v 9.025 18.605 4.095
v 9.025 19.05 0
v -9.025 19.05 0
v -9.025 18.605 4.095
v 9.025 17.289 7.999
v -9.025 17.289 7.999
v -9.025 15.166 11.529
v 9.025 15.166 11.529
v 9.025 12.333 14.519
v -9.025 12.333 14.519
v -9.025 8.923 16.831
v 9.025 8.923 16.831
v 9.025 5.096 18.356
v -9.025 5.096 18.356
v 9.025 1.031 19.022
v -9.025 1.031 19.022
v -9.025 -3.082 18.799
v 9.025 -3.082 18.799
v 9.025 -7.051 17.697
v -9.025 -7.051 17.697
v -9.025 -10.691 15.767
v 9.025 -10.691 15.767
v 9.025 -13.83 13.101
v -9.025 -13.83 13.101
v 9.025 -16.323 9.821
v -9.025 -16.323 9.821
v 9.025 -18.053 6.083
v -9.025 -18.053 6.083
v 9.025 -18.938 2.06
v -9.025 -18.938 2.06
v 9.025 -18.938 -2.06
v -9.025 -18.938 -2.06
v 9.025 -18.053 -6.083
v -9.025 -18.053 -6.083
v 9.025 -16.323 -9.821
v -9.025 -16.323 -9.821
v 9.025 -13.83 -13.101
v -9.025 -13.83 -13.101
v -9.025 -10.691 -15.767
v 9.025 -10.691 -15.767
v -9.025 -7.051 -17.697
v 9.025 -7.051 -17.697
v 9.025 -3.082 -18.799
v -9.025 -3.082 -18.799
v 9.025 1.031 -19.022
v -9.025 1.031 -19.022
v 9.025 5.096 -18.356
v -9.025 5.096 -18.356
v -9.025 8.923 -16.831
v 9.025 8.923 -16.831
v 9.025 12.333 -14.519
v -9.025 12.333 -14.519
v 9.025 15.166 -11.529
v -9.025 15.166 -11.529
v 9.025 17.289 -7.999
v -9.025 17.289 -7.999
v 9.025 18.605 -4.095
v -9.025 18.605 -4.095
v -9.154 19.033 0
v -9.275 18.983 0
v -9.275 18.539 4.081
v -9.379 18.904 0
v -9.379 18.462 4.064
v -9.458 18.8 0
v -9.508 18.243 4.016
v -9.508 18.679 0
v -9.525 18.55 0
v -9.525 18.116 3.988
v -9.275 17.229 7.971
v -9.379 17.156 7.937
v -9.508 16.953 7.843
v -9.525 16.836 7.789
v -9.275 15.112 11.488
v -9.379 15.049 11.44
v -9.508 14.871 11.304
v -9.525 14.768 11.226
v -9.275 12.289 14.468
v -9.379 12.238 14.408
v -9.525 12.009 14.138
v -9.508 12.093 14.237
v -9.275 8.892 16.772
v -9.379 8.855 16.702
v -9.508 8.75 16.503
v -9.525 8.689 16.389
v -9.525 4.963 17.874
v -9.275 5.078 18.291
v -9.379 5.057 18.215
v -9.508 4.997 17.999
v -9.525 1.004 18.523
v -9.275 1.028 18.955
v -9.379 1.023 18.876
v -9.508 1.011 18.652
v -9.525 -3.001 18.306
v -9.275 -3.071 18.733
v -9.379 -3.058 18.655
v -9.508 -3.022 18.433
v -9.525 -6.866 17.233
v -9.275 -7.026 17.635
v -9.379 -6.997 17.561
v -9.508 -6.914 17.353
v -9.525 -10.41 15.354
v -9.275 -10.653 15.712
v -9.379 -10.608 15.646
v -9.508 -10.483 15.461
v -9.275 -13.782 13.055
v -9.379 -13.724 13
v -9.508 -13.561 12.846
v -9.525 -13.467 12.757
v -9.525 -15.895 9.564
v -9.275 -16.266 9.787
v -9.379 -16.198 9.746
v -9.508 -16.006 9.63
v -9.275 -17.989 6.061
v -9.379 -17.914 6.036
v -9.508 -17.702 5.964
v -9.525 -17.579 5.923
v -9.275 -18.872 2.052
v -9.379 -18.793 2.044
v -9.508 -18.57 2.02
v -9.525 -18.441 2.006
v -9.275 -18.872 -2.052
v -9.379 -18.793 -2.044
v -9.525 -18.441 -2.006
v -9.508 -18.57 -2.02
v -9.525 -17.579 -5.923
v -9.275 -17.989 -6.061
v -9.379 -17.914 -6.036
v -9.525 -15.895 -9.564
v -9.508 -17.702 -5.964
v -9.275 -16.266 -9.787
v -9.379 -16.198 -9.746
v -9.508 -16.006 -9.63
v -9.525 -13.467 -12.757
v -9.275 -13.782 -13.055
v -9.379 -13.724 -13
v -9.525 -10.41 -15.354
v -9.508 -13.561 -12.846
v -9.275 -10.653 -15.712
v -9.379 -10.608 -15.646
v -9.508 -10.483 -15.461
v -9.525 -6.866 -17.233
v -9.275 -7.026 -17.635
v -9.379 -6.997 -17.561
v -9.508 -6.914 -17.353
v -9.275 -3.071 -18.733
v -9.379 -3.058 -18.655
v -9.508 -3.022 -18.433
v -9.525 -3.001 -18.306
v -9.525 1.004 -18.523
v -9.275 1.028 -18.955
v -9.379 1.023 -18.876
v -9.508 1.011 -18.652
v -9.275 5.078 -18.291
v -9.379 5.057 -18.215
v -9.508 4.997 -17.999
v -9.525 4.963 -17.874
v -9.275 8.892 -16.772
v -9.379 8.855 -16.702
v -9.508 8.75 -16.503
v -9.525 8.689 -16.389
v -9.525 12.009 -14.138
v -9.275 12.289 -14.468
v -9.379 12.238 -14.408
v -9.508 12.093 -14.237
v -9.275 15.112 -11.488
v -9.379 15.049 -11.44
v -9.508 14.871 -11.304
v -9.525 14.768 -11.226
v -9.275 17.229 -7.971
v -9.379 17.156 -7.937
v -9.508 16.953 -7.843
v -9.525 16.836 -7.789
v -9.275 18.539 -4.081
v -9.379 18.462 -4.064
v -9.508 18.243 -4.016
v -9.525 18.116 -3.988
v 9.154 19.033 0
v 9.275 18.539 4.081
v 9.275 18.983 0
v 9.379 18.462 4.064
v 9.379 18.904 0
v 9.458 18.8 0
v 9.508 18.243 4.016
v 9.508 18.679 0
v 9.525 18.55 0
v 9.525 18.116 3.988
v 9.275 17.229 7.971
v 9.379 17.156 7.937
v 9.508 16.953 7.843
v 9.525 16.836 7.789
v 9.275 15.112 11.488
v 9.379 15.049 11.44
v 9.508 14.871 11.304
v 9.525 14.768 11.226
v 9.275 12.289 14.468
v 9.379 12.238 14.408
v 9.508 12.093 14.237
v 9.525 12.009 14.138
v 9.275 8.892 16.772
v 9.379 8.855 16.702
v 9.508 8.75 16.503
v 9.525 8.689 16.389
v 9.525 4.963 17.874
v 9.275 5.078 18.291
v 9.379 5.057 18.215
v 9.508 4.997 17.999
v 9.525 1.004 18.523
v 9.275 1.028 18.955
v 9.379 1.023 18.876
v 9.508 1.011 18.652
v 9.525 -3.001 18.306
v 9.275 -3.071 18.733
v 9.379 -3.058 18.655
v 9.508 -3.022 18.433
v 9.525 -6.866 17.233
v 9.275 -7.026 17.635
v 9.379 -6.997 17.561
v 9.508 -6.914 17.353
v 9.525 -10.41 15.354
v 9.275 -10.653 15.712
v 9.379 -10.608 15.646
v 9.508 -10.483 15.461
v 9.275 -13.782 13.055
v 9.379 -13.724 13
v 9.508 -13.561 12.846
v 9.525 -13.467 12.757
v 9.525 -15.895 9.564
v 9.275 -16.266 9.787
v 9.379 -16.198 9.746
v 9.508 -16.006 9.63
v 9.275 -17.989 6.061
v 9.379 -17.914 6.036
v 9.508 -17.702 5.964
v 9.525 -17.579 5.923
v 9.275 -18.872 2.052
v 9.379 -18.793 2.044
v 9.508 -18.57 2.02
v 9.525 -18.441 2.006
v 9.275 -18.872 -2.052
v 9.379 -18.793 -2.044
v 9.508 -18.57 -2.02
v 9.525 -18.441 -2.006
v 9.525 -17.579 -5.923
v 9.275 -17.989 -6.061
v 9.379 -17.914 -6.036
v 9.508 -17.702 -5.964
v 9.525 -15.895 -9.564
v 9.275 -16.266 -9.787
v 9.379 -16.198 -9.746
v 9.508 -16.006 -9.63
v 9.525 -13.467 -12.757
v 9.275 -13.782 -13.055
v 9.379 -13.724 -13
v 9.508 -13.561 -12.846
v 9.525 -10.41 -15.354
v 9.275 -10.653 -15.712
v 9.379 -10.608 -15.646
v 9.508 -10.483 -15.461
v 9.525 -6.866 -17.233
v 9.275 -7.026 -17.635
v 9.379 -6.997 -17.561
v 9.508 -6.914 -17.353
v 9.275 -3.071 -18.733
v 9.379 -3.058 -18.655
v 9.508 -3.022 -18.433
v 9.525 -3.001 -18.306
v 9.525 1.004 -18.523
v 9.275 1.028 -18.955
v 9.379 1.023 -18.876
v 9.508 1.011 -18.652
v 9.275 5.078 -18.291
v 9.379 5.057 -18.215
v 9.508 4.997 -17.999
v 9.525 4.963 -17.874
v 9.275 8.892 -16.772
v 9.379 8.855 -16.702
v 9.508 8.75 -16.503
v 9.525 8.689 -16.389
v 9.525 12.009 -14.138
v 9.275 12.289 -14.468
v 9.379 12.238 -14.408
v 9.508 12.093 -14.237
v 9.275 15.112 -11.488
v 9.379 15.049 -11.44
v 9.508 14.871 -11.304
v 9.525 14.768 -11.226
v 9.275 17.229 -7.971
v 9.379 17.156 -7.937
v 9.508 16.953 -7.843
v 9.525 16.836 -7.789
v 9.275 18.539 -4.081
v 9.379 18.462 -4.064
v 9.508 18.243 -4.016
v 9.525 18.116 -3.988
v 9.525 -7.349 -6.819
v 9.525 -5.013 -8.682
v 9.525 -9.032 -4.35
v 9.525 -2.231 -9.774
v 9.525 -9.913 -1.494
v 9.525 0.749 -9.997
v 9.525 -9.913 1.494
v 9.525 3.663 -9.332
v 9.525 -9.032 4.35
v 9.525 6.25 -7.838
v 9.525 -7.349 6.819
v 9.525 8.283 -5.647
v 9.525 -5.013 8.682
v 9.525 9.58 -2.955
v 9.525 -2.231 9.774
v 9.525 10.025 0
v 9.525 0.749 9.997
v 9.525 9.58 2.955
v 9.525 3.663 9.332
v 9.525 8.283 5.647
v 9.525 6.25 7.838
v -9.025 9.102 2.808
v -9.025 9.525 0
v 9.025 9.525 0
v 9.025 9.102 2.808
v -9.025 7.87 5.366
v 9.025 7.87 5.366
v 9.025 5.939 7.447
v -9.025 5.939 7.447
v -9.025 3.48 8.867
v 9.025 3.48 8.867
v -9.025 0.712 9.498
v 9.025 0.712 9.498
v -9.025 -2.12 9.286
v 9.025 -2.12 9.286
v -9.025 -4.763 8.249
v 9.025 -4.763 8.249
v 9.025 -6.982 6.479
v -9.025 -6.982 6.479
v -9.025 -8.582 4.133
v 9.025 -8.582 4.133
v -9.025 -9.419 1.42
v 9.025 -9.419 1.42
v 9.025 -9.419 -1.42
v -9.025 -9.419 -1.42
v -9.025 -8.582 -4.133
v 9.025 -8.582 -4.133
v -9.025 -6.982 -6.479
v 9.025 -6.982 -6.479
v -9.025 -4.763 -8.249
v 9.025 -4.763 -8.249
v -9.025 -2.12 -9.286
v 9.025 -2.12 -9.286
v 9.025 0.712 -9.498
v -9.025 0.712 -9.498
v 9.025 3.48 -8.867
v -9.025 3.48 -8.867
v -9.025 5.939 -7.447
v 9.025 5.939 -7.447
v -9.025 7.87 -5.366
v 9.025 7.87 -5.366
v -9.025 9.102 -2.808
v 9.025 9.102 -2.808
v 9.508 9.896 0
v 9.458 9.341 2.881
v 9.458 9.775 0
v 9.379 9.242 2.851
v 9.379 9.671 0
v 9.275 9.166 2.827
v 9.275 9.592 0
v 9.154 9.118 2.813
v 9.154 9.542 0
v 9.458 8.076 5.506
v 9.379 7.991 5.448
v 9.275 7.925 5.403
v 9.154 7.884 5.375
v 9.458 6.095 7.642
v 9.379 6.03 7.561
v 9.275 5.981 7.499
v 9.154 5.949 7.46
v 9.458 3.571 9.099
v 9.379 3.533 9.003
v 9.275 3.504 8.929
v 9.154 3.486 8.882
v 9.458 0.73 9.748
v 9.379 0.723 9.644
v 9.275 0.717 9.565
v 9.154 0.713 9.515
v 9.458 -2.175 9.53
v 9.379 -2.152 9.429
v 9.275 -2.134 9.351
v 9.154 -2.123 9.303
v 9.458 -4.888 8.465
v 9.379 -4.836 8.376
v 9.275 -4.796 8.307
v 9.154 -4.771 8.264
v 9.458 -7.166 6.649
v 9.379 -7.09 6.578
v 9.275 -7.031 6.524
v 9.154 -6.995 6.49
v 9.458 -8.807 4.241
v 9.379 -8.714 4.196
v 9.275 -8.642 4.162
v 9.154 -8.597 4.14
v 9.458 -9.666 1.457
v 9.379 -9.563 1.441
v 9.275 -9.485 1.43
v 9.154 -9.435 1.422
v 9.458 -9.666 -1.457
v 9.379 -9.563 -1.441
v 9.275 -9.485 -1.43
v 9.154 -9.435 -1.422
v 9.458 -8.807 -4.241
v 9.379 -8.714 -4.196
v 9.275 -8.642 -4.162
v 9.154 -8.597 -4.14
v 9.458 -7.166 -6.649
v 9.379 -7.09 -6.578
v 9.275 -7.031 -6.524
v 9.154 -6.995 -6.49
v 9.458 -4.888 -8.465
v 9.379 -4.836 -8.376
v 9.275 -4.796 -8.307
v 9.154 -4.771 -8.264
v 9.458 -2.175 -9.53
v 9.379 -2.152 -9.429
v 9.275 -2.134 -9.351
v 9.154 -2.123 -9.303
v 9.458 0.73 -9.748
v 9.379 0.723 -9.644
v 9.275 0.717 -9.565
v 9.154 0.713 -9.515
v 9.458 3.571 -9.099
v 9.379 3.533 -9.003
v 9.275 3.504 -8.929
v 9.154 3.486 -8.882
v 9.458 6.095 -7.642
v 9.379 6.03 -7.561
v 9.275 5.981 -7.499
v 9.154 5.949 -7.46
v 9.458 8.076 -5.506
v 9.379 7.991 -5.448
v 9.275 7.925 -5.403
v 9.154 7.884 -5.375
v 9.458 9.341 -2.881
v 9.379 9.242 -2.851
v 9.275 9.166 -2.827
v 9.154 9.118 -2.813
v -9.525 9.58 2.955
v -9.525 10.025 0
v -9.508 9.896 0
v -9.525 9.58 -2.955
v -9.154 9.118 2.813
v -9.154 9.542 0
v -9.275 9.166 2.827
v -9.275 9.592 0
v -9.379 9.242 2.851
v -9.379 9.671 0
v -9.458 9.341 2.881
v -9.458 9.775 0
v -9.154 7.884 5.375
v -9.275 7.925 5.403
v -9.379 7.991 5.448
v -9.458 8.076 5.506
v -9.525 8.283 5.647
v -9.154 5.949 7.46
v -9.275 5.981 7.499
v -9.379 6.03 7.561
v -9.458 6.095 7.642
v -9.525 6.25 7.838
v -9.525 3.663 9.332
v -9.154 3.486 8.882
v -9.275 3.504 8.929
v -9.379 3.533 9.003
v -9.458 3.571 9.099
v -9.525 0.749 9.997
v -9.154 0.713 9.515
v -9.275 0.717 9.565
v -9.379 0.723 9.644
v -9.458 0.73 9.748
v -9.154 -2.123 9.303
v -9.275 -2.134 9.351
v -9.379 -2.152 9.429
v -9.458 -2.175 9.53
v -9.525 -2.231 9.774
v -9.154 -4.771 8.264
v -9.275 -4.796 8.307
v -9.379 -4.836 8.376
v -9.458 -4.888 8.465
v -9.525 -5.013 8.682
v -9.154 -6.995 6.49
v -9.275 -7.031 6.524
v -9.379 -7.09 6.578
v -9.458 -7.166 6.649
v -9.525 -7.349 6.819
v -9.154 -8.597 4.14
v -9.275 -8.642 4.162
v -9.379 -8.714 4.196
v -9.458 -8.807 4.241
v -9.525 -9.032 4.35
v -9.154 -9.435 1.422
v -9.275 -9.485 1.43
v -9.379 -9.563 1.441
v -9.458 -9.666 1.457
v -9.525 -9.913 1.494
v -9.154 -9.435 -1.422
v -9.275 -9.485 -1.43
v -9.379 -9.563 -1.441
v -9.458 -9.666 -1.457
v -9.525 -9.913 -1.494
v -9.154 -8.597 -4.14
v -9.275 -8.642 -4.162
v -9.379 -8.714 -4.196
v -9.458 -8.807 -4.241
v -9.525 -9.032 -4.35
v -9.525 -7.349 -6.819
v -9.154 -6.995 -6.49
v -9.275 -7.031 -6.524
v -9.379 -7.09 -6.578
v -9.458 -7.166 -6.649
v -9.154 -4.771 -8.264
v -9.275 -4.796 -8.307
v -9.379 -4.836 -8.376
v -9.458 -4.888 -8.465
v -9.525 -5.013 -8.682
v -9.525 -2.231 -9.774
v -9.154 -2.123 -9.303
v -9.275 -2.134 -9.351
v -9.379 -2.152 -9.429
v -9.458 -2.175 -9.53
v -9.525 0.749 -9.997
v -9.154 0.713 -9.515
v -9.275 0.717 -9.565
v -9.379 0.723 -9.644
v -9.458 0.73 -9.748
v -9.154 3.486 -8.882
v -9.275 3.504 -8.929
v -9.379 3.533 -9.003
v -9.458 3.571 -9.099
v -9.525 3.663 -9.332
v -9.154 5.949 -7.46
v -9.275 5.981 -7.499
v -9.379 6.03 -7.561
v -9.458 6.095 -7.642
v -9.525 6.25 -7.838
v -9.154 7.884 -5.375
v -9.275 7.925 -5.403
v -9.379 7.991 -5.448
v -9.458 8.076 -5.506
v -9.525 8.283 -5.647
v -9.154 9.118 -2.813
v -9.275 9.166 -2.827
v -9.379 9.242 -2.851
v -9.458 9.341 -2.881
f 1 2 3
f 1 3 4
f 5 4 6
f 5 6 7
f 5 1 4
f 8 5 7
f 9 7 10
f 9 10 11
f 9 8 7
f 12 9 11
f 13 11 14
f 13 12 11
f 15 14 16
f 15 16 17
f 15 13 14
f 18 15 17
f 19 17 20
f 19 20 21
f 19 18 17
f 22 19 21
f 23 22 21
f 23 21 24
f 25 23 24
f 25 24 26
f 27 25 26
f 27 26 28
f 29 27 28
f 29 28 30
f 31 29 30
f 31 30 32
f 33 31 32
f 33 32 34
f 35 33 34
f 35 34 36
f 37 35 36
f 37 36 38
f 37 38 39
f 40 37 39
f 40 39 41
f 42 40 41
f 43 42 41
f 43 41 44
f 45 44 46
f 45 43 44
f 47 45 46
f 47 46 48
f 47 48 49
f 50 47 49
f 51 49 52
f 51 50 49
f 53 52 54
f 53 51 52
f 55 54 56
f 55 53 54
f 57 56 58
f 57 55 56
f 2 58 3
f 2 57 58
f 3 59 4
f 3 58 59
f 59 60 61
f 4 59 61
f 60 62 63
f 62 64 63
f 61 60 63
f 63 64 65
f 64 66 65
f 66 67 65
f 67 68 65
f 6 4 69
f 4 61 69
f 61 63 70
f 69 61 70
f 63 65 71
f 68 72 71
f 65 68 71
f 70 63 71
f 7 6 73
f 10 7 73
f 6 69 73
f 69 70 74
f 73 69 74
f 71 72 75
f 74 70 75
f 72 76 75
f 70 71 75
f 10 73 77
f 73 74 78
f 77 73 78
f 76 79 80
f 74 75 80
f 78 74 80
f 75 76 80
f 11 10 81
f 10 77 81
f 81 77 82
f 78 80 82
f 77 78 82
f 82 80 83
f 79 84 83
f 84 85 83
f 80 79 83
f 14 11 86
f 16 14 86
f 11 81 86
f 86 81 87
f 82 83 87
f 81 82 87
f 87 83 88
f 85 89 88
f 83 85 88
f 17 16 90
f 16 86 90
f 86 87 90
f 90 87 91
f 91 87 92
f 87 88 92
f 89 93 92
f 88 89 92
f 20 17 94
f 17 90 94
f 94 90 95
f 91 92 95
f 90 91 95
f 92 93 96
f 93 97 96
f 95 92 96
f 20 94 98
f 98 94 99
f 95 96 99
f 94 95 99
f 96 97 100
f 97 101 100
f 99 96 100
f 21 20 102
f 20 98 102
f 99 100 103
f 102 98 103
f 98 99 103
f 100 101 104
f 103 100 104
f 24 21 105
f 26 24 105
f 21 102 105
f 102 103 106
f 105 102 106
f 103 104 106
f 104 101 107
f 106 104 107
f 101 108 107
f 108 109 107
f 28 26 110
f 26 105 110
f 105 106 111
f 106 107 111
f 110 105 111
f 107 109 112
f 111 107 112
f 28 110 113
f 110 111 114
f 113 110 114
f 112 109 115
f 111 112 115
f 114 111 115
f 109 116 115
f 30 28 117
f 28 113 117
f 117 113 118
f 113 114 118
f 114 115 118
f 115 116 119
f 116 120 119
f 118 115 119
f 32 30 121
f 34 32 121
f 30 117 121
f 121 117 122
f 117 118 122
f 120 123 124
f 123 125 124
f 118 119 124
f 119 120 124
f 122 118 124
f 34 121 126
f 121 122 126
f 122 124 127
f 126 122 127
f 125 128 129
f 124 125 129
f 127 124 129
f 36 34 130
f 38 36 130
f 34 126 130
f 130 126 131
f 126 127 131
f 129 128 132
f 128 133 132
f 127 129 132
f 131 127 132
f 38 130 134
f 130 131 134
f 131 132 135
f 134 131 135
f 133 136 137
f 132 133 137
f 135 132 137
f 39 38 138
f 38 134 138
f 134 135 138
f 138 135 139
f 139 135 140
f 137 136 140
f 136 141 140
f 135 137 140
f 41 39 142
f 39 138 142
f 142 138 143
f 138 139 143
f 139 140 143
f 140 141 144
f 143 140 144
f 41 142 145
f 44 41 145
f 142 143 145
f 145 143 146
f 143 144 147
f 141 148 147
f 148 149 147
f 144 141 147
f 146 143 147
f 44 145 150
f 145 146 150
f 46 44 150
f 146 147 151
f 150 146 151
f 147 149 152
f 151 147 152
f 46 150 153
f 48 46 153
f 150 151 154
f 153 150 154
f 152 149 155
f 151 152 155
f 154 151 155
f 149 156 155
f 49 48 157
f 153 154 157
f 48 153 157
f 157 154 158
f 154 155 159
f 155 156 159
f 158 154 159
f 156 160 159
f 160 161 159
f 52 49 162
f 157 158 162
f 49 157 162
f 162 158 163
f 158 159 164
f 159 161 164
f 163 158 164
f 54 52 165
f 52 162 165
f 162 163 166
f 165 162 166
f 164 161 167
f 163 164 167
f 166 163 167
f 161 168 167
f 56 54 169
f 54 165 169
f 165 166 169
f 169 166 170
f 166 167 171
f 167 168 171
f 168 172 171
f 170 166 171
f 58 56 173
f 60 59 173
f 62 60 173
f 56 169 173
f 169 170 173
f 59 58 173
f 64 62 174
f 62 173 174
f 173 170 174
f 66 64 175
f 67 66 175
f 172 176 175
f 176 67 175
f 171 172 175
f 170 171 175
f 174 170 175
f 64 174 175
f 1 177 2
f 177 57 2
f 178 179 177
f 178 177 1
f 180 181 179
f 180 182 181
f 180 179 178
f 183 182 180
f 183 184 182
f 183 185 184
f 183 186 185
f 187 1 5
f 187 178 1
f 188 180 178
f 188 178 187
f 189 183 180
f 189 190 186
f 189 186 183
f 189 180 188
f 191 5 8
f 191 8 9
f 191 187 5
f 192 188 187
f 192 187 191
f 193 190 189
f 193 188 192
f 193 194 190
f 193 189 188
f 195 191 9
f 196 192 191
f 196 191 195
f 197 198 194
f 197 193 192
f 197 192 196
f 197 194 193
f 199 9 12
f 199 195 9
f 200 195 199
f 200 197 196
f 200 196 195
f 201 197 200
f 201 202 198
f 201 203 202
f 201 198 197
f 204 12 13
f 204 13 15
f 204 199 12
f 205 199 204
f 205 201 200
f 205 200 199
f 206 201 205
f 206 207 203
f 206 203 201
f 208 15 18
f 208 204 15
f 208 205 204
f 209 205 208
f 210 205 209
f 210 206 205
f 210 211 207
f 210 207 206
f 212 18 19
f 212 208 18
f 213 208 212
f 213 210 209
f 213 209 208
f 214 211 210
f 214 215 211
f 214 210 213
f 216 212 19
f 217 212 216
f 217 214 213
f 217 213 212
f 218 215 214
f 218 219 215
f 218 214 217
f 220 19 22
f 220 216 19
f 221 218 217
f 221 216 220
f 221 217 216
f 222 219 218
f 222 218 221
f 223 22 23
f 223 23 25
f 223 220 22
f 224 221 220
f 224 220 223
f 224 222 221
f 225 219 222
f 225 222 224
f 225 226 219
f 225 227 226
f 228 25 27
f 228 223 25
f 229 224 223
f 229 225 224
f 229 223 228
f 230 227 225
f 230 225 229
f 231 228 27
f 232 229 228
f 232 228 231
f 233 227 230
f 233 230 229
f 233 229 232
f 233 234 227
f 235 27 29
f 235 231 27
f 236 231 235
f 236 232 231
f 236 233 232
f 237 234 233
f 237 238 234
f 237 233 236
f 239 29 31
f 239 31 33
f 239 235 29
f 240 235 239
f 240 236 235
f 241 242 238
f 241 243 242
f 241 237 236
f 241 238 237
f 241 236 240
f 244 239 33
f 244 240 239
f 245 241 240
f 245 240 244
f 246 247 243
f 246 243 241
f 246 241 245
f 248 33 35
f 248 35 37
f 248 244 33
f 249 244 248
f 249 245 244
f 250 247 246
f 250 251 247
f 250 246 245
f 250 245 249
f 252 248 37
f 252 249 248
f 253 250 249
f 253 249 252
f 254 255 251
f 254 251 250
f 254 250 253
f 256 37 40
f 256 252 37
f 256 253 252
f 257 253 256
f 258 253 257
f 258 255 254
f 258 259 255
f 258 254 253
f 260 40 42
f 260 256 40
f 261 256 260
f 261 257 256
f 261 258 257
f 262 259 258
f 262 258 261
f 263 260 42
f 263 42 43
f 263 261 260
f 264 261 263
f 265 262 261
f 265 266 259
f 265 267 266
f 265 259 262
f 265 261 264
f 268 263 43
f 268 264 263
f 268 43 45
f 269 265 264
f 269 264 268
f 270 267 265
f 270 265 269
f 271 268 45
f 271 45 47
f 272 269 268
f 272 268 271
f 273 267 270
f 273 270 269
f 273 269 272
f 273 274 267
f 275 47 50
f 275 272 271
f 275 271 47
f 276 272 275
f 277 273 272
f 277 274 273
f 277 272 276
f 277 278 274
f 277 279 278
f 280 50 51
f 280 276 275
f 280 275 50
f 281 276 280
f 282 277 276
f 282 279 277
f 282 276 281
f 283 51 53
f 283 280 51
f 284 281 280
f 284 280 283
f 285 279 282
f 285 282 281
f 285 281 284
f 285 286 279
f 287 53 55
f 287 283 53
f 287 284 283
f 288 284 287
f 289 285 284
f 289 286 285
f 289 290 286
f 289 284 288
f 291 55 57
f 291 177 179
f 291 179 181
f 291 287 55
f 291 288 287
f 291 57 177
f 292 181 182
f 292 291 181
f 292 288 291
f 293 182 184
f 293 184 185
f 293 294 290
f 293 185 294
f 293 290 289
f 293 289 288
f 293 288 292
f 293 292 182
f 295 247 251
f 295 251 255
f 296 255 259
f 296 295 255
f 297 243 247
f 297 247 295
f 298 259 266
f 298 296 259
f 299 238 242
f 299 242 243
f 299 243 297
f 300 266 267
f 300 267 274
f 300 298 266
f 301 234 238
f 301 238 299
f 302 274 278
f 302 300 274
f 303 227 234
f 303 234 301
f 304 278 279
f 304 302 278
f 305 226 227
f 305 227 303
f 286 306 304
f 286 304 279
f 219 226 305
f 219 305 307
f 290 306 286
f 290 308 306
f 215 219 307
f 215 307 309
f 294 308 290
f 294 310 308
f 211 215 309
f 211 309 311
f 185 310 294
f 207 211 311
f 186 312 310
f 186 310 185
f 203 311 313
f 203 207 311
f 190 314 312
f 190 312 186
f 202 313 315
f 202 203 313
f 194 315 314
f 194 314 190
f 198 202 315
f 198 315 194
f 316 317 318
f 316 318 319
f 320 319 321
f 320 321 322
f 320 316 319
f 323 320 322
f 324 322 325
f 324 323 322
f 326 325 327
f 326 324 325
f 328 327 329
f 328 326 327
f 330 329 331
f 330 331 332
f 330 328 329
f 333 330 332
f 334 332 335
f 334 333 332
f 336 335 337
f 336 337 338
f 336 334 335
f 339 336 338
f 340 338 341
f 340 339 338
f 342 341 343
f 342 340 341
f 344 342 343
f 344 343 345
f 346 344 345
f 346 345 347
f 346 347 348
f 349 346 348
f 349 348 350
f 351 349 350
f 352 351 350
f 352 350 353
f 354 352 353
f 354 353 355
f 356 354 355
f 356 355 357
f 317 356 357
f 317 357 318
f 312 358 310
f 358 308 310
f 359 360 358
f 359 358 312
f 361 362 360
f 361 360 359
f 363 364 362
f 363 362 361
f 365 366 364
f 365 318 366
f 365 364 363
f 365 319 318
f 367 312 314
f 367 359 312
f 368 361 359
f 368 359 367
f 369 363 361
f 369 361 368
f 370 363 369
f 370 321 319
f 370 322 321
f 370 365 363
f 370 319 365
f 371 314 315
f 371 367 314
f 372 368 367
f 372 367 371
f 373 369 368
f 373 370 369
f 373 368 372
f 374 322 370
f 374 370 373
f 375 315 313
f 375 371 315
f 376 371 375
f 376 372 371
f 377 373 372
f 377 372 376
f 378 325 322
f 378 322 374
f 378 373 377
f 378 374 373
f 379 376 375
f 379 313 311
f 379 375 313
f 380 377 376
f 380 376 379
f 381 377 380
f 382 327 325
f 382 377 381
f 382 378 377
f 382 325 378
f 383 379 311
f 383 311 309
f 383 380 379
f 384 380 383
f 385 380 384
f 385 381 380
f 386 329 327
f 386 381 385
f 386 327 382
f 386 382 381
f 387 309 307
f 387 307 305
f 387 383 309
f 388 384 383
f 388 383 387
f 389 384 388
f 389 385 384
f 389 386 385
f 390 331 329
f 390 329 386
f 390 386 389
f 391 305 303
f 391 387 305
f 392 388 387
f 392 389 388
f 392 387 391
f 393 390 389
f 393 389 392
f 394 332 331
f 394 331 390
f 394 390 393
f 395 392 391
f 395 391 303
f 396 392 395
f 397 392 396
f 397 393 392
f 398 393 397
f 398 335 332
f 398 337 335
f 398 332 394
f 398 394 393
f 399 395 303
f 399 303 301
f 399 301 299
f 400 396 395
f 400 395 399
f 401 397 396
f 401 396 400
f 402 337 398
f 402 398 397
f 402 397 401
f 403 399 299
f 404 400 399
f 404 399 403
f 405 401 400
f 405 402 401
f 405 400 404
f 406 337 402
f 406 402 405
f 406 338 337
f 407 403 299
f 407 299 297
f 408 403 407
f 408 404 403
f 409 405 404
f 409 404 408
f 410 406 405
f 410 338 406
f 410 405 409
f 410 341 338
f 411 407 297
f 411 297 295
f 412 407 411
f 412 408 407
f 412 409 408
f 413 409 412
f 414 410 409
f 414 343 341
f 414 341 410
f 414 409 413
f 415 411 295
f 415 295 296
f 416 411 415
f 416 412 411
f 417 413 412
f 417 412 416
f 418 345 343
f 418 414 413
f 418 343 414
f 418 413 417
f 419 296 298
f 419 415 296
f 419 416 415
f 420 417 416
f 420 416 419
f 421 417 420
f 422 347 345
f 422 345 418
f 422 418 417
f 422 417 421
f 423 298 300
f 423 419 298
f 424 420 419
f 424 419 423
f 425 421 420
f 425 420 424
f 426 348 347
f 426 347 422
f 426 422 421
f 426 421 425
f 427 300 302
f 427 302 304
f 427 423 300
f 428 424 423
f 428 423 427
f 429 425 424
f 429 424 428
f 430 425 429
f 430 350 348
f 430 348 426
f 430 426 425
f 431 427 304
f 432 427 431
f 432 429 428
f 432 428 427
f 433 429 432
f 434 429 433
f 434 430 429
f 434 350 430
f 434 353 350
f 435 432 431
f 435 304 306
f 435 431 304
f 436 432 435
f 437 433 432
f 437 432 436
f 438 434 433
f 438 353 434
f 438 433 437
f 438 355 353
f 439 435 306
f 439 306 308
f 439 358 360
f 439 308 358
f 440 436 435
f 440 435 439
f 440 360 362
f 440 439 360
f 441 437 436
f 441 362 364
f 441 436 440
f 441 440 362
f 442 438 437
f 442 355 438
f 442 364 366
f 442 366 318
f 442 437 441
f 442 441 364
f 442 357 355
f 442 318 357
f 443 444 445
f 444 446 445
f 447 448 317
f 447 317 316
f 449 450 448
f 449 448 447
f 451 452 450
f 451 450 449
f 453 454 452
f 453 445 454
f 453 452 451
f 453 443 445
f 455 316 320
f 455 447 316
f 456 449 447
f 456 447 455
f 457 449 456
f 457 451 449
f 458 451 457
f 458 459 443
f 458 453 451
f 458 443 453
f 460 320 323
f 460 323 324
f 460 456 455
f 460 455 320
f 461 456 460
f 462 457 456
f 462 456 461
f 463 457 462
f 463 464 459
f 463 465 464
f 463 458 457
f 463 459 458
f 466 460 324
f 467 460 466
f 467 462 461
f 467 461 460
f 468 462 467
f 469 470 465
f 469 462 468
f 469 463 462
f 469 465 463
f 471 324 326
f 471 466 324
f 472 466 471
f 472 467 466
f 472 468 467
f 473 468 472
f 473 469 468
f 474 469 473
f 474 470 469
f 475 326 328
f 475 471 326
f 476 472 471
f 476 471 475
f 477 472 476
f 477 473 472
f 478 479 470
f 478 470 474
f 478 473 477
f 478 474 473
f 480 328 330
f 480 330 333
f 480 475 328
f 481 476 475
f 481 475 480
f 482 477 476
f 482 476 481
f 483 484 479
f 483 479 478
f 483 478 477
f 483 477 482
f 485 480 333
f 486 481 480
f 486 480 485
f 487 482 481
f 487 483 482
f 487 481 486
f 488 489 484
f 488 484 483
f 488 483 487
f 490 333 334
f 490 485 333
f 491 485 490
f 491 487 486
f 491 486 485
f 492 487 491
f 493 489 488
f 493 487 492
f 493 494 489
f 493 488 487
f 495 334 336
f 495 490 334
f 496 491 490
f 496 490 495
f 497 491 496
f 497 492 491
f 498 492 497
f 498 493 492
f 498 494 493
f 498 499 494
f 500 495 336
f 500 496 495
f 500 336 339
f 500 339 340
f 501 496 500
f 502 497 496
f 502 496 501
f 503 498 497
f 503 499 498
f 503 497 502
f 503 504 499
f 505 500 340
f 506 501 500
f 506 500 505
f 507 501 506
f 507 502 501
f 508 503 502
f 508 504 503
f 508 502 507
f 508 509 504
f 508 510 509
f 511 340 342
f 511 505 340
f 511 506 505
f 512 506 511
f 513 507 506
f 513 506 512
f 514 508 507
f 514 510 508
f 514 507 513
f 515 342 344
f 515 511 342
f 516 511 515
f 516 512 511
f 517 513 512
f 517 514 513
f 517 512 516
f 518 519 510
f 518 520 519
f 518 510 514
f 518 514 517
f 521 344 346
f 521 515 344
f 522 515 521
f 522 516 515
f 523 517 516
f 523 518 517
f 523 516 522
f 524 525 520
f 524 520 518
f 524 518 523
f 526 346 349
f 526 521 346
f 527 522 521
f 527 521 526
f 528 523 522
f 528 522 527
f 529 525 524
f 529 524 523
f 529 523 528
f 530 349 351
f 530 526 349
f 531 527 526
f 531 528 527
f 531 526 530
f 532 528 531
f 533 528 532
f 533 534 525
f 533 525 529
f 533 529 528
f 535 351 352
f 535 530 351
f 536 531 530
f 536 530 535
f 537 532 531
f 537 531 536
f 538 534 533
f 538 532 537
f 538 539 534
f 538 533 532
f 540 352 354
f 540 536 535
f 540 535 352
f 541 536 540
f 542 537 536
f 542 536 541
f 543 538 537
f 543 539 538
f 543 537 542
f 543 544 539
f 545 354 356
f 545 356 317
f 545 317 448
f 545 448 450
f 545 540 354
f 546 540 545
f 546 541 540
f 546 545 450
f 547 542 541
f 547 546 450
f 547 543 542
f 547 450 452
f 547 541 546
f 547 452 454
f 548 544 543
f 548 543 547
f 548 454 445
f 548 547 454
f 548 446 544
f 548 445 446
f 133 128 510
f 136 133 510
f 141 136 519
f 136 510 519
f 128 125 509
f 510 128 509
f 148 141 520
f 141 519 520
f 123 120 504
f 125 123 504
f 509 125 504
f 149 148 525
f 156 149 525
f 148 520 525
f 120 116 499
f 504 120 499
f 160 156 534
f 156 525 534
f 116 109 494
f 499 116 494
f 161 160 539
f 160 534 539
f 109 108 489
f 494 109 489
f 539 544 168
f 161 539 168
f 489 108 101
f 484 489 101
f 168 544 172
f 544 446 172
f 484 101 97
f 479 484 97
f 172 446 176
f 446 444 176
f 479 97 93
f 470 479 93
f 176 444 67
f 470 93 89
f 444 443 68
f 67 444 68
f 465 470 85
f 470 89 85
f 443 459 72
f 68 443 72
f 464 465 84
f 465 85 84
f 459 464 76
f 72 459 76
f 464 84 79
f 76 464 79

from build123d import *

# Parameters (mm, degrees)
F0_R     = 19.05
F0_R_2   = 9.525
F1_DEPTH = 9.525
F2_R     = 0.5


with BuildPart() as f1:
    # F0 (on Right) → F1 (new body, symmetric)
    with BuildSketch(Plane.YZ):
        Circle(F0_R)
        Circle(F0_R_2, mode=Mode.SUBTRACT)
    extrude(amount=F1_DEPTH, both=True)

    # F2
    f2_edges = [f1.edges().sort_by_distance(p)[0] for p in [
        (9.525, -19.05, 0),
        (9.525, -9.525, 0),
        (-9.525, -19.05, 0),
        (-9.525, -9.525, 0),
    ]]
    fillet(f2_edges, radius=F2_R)


solid = f1.part
